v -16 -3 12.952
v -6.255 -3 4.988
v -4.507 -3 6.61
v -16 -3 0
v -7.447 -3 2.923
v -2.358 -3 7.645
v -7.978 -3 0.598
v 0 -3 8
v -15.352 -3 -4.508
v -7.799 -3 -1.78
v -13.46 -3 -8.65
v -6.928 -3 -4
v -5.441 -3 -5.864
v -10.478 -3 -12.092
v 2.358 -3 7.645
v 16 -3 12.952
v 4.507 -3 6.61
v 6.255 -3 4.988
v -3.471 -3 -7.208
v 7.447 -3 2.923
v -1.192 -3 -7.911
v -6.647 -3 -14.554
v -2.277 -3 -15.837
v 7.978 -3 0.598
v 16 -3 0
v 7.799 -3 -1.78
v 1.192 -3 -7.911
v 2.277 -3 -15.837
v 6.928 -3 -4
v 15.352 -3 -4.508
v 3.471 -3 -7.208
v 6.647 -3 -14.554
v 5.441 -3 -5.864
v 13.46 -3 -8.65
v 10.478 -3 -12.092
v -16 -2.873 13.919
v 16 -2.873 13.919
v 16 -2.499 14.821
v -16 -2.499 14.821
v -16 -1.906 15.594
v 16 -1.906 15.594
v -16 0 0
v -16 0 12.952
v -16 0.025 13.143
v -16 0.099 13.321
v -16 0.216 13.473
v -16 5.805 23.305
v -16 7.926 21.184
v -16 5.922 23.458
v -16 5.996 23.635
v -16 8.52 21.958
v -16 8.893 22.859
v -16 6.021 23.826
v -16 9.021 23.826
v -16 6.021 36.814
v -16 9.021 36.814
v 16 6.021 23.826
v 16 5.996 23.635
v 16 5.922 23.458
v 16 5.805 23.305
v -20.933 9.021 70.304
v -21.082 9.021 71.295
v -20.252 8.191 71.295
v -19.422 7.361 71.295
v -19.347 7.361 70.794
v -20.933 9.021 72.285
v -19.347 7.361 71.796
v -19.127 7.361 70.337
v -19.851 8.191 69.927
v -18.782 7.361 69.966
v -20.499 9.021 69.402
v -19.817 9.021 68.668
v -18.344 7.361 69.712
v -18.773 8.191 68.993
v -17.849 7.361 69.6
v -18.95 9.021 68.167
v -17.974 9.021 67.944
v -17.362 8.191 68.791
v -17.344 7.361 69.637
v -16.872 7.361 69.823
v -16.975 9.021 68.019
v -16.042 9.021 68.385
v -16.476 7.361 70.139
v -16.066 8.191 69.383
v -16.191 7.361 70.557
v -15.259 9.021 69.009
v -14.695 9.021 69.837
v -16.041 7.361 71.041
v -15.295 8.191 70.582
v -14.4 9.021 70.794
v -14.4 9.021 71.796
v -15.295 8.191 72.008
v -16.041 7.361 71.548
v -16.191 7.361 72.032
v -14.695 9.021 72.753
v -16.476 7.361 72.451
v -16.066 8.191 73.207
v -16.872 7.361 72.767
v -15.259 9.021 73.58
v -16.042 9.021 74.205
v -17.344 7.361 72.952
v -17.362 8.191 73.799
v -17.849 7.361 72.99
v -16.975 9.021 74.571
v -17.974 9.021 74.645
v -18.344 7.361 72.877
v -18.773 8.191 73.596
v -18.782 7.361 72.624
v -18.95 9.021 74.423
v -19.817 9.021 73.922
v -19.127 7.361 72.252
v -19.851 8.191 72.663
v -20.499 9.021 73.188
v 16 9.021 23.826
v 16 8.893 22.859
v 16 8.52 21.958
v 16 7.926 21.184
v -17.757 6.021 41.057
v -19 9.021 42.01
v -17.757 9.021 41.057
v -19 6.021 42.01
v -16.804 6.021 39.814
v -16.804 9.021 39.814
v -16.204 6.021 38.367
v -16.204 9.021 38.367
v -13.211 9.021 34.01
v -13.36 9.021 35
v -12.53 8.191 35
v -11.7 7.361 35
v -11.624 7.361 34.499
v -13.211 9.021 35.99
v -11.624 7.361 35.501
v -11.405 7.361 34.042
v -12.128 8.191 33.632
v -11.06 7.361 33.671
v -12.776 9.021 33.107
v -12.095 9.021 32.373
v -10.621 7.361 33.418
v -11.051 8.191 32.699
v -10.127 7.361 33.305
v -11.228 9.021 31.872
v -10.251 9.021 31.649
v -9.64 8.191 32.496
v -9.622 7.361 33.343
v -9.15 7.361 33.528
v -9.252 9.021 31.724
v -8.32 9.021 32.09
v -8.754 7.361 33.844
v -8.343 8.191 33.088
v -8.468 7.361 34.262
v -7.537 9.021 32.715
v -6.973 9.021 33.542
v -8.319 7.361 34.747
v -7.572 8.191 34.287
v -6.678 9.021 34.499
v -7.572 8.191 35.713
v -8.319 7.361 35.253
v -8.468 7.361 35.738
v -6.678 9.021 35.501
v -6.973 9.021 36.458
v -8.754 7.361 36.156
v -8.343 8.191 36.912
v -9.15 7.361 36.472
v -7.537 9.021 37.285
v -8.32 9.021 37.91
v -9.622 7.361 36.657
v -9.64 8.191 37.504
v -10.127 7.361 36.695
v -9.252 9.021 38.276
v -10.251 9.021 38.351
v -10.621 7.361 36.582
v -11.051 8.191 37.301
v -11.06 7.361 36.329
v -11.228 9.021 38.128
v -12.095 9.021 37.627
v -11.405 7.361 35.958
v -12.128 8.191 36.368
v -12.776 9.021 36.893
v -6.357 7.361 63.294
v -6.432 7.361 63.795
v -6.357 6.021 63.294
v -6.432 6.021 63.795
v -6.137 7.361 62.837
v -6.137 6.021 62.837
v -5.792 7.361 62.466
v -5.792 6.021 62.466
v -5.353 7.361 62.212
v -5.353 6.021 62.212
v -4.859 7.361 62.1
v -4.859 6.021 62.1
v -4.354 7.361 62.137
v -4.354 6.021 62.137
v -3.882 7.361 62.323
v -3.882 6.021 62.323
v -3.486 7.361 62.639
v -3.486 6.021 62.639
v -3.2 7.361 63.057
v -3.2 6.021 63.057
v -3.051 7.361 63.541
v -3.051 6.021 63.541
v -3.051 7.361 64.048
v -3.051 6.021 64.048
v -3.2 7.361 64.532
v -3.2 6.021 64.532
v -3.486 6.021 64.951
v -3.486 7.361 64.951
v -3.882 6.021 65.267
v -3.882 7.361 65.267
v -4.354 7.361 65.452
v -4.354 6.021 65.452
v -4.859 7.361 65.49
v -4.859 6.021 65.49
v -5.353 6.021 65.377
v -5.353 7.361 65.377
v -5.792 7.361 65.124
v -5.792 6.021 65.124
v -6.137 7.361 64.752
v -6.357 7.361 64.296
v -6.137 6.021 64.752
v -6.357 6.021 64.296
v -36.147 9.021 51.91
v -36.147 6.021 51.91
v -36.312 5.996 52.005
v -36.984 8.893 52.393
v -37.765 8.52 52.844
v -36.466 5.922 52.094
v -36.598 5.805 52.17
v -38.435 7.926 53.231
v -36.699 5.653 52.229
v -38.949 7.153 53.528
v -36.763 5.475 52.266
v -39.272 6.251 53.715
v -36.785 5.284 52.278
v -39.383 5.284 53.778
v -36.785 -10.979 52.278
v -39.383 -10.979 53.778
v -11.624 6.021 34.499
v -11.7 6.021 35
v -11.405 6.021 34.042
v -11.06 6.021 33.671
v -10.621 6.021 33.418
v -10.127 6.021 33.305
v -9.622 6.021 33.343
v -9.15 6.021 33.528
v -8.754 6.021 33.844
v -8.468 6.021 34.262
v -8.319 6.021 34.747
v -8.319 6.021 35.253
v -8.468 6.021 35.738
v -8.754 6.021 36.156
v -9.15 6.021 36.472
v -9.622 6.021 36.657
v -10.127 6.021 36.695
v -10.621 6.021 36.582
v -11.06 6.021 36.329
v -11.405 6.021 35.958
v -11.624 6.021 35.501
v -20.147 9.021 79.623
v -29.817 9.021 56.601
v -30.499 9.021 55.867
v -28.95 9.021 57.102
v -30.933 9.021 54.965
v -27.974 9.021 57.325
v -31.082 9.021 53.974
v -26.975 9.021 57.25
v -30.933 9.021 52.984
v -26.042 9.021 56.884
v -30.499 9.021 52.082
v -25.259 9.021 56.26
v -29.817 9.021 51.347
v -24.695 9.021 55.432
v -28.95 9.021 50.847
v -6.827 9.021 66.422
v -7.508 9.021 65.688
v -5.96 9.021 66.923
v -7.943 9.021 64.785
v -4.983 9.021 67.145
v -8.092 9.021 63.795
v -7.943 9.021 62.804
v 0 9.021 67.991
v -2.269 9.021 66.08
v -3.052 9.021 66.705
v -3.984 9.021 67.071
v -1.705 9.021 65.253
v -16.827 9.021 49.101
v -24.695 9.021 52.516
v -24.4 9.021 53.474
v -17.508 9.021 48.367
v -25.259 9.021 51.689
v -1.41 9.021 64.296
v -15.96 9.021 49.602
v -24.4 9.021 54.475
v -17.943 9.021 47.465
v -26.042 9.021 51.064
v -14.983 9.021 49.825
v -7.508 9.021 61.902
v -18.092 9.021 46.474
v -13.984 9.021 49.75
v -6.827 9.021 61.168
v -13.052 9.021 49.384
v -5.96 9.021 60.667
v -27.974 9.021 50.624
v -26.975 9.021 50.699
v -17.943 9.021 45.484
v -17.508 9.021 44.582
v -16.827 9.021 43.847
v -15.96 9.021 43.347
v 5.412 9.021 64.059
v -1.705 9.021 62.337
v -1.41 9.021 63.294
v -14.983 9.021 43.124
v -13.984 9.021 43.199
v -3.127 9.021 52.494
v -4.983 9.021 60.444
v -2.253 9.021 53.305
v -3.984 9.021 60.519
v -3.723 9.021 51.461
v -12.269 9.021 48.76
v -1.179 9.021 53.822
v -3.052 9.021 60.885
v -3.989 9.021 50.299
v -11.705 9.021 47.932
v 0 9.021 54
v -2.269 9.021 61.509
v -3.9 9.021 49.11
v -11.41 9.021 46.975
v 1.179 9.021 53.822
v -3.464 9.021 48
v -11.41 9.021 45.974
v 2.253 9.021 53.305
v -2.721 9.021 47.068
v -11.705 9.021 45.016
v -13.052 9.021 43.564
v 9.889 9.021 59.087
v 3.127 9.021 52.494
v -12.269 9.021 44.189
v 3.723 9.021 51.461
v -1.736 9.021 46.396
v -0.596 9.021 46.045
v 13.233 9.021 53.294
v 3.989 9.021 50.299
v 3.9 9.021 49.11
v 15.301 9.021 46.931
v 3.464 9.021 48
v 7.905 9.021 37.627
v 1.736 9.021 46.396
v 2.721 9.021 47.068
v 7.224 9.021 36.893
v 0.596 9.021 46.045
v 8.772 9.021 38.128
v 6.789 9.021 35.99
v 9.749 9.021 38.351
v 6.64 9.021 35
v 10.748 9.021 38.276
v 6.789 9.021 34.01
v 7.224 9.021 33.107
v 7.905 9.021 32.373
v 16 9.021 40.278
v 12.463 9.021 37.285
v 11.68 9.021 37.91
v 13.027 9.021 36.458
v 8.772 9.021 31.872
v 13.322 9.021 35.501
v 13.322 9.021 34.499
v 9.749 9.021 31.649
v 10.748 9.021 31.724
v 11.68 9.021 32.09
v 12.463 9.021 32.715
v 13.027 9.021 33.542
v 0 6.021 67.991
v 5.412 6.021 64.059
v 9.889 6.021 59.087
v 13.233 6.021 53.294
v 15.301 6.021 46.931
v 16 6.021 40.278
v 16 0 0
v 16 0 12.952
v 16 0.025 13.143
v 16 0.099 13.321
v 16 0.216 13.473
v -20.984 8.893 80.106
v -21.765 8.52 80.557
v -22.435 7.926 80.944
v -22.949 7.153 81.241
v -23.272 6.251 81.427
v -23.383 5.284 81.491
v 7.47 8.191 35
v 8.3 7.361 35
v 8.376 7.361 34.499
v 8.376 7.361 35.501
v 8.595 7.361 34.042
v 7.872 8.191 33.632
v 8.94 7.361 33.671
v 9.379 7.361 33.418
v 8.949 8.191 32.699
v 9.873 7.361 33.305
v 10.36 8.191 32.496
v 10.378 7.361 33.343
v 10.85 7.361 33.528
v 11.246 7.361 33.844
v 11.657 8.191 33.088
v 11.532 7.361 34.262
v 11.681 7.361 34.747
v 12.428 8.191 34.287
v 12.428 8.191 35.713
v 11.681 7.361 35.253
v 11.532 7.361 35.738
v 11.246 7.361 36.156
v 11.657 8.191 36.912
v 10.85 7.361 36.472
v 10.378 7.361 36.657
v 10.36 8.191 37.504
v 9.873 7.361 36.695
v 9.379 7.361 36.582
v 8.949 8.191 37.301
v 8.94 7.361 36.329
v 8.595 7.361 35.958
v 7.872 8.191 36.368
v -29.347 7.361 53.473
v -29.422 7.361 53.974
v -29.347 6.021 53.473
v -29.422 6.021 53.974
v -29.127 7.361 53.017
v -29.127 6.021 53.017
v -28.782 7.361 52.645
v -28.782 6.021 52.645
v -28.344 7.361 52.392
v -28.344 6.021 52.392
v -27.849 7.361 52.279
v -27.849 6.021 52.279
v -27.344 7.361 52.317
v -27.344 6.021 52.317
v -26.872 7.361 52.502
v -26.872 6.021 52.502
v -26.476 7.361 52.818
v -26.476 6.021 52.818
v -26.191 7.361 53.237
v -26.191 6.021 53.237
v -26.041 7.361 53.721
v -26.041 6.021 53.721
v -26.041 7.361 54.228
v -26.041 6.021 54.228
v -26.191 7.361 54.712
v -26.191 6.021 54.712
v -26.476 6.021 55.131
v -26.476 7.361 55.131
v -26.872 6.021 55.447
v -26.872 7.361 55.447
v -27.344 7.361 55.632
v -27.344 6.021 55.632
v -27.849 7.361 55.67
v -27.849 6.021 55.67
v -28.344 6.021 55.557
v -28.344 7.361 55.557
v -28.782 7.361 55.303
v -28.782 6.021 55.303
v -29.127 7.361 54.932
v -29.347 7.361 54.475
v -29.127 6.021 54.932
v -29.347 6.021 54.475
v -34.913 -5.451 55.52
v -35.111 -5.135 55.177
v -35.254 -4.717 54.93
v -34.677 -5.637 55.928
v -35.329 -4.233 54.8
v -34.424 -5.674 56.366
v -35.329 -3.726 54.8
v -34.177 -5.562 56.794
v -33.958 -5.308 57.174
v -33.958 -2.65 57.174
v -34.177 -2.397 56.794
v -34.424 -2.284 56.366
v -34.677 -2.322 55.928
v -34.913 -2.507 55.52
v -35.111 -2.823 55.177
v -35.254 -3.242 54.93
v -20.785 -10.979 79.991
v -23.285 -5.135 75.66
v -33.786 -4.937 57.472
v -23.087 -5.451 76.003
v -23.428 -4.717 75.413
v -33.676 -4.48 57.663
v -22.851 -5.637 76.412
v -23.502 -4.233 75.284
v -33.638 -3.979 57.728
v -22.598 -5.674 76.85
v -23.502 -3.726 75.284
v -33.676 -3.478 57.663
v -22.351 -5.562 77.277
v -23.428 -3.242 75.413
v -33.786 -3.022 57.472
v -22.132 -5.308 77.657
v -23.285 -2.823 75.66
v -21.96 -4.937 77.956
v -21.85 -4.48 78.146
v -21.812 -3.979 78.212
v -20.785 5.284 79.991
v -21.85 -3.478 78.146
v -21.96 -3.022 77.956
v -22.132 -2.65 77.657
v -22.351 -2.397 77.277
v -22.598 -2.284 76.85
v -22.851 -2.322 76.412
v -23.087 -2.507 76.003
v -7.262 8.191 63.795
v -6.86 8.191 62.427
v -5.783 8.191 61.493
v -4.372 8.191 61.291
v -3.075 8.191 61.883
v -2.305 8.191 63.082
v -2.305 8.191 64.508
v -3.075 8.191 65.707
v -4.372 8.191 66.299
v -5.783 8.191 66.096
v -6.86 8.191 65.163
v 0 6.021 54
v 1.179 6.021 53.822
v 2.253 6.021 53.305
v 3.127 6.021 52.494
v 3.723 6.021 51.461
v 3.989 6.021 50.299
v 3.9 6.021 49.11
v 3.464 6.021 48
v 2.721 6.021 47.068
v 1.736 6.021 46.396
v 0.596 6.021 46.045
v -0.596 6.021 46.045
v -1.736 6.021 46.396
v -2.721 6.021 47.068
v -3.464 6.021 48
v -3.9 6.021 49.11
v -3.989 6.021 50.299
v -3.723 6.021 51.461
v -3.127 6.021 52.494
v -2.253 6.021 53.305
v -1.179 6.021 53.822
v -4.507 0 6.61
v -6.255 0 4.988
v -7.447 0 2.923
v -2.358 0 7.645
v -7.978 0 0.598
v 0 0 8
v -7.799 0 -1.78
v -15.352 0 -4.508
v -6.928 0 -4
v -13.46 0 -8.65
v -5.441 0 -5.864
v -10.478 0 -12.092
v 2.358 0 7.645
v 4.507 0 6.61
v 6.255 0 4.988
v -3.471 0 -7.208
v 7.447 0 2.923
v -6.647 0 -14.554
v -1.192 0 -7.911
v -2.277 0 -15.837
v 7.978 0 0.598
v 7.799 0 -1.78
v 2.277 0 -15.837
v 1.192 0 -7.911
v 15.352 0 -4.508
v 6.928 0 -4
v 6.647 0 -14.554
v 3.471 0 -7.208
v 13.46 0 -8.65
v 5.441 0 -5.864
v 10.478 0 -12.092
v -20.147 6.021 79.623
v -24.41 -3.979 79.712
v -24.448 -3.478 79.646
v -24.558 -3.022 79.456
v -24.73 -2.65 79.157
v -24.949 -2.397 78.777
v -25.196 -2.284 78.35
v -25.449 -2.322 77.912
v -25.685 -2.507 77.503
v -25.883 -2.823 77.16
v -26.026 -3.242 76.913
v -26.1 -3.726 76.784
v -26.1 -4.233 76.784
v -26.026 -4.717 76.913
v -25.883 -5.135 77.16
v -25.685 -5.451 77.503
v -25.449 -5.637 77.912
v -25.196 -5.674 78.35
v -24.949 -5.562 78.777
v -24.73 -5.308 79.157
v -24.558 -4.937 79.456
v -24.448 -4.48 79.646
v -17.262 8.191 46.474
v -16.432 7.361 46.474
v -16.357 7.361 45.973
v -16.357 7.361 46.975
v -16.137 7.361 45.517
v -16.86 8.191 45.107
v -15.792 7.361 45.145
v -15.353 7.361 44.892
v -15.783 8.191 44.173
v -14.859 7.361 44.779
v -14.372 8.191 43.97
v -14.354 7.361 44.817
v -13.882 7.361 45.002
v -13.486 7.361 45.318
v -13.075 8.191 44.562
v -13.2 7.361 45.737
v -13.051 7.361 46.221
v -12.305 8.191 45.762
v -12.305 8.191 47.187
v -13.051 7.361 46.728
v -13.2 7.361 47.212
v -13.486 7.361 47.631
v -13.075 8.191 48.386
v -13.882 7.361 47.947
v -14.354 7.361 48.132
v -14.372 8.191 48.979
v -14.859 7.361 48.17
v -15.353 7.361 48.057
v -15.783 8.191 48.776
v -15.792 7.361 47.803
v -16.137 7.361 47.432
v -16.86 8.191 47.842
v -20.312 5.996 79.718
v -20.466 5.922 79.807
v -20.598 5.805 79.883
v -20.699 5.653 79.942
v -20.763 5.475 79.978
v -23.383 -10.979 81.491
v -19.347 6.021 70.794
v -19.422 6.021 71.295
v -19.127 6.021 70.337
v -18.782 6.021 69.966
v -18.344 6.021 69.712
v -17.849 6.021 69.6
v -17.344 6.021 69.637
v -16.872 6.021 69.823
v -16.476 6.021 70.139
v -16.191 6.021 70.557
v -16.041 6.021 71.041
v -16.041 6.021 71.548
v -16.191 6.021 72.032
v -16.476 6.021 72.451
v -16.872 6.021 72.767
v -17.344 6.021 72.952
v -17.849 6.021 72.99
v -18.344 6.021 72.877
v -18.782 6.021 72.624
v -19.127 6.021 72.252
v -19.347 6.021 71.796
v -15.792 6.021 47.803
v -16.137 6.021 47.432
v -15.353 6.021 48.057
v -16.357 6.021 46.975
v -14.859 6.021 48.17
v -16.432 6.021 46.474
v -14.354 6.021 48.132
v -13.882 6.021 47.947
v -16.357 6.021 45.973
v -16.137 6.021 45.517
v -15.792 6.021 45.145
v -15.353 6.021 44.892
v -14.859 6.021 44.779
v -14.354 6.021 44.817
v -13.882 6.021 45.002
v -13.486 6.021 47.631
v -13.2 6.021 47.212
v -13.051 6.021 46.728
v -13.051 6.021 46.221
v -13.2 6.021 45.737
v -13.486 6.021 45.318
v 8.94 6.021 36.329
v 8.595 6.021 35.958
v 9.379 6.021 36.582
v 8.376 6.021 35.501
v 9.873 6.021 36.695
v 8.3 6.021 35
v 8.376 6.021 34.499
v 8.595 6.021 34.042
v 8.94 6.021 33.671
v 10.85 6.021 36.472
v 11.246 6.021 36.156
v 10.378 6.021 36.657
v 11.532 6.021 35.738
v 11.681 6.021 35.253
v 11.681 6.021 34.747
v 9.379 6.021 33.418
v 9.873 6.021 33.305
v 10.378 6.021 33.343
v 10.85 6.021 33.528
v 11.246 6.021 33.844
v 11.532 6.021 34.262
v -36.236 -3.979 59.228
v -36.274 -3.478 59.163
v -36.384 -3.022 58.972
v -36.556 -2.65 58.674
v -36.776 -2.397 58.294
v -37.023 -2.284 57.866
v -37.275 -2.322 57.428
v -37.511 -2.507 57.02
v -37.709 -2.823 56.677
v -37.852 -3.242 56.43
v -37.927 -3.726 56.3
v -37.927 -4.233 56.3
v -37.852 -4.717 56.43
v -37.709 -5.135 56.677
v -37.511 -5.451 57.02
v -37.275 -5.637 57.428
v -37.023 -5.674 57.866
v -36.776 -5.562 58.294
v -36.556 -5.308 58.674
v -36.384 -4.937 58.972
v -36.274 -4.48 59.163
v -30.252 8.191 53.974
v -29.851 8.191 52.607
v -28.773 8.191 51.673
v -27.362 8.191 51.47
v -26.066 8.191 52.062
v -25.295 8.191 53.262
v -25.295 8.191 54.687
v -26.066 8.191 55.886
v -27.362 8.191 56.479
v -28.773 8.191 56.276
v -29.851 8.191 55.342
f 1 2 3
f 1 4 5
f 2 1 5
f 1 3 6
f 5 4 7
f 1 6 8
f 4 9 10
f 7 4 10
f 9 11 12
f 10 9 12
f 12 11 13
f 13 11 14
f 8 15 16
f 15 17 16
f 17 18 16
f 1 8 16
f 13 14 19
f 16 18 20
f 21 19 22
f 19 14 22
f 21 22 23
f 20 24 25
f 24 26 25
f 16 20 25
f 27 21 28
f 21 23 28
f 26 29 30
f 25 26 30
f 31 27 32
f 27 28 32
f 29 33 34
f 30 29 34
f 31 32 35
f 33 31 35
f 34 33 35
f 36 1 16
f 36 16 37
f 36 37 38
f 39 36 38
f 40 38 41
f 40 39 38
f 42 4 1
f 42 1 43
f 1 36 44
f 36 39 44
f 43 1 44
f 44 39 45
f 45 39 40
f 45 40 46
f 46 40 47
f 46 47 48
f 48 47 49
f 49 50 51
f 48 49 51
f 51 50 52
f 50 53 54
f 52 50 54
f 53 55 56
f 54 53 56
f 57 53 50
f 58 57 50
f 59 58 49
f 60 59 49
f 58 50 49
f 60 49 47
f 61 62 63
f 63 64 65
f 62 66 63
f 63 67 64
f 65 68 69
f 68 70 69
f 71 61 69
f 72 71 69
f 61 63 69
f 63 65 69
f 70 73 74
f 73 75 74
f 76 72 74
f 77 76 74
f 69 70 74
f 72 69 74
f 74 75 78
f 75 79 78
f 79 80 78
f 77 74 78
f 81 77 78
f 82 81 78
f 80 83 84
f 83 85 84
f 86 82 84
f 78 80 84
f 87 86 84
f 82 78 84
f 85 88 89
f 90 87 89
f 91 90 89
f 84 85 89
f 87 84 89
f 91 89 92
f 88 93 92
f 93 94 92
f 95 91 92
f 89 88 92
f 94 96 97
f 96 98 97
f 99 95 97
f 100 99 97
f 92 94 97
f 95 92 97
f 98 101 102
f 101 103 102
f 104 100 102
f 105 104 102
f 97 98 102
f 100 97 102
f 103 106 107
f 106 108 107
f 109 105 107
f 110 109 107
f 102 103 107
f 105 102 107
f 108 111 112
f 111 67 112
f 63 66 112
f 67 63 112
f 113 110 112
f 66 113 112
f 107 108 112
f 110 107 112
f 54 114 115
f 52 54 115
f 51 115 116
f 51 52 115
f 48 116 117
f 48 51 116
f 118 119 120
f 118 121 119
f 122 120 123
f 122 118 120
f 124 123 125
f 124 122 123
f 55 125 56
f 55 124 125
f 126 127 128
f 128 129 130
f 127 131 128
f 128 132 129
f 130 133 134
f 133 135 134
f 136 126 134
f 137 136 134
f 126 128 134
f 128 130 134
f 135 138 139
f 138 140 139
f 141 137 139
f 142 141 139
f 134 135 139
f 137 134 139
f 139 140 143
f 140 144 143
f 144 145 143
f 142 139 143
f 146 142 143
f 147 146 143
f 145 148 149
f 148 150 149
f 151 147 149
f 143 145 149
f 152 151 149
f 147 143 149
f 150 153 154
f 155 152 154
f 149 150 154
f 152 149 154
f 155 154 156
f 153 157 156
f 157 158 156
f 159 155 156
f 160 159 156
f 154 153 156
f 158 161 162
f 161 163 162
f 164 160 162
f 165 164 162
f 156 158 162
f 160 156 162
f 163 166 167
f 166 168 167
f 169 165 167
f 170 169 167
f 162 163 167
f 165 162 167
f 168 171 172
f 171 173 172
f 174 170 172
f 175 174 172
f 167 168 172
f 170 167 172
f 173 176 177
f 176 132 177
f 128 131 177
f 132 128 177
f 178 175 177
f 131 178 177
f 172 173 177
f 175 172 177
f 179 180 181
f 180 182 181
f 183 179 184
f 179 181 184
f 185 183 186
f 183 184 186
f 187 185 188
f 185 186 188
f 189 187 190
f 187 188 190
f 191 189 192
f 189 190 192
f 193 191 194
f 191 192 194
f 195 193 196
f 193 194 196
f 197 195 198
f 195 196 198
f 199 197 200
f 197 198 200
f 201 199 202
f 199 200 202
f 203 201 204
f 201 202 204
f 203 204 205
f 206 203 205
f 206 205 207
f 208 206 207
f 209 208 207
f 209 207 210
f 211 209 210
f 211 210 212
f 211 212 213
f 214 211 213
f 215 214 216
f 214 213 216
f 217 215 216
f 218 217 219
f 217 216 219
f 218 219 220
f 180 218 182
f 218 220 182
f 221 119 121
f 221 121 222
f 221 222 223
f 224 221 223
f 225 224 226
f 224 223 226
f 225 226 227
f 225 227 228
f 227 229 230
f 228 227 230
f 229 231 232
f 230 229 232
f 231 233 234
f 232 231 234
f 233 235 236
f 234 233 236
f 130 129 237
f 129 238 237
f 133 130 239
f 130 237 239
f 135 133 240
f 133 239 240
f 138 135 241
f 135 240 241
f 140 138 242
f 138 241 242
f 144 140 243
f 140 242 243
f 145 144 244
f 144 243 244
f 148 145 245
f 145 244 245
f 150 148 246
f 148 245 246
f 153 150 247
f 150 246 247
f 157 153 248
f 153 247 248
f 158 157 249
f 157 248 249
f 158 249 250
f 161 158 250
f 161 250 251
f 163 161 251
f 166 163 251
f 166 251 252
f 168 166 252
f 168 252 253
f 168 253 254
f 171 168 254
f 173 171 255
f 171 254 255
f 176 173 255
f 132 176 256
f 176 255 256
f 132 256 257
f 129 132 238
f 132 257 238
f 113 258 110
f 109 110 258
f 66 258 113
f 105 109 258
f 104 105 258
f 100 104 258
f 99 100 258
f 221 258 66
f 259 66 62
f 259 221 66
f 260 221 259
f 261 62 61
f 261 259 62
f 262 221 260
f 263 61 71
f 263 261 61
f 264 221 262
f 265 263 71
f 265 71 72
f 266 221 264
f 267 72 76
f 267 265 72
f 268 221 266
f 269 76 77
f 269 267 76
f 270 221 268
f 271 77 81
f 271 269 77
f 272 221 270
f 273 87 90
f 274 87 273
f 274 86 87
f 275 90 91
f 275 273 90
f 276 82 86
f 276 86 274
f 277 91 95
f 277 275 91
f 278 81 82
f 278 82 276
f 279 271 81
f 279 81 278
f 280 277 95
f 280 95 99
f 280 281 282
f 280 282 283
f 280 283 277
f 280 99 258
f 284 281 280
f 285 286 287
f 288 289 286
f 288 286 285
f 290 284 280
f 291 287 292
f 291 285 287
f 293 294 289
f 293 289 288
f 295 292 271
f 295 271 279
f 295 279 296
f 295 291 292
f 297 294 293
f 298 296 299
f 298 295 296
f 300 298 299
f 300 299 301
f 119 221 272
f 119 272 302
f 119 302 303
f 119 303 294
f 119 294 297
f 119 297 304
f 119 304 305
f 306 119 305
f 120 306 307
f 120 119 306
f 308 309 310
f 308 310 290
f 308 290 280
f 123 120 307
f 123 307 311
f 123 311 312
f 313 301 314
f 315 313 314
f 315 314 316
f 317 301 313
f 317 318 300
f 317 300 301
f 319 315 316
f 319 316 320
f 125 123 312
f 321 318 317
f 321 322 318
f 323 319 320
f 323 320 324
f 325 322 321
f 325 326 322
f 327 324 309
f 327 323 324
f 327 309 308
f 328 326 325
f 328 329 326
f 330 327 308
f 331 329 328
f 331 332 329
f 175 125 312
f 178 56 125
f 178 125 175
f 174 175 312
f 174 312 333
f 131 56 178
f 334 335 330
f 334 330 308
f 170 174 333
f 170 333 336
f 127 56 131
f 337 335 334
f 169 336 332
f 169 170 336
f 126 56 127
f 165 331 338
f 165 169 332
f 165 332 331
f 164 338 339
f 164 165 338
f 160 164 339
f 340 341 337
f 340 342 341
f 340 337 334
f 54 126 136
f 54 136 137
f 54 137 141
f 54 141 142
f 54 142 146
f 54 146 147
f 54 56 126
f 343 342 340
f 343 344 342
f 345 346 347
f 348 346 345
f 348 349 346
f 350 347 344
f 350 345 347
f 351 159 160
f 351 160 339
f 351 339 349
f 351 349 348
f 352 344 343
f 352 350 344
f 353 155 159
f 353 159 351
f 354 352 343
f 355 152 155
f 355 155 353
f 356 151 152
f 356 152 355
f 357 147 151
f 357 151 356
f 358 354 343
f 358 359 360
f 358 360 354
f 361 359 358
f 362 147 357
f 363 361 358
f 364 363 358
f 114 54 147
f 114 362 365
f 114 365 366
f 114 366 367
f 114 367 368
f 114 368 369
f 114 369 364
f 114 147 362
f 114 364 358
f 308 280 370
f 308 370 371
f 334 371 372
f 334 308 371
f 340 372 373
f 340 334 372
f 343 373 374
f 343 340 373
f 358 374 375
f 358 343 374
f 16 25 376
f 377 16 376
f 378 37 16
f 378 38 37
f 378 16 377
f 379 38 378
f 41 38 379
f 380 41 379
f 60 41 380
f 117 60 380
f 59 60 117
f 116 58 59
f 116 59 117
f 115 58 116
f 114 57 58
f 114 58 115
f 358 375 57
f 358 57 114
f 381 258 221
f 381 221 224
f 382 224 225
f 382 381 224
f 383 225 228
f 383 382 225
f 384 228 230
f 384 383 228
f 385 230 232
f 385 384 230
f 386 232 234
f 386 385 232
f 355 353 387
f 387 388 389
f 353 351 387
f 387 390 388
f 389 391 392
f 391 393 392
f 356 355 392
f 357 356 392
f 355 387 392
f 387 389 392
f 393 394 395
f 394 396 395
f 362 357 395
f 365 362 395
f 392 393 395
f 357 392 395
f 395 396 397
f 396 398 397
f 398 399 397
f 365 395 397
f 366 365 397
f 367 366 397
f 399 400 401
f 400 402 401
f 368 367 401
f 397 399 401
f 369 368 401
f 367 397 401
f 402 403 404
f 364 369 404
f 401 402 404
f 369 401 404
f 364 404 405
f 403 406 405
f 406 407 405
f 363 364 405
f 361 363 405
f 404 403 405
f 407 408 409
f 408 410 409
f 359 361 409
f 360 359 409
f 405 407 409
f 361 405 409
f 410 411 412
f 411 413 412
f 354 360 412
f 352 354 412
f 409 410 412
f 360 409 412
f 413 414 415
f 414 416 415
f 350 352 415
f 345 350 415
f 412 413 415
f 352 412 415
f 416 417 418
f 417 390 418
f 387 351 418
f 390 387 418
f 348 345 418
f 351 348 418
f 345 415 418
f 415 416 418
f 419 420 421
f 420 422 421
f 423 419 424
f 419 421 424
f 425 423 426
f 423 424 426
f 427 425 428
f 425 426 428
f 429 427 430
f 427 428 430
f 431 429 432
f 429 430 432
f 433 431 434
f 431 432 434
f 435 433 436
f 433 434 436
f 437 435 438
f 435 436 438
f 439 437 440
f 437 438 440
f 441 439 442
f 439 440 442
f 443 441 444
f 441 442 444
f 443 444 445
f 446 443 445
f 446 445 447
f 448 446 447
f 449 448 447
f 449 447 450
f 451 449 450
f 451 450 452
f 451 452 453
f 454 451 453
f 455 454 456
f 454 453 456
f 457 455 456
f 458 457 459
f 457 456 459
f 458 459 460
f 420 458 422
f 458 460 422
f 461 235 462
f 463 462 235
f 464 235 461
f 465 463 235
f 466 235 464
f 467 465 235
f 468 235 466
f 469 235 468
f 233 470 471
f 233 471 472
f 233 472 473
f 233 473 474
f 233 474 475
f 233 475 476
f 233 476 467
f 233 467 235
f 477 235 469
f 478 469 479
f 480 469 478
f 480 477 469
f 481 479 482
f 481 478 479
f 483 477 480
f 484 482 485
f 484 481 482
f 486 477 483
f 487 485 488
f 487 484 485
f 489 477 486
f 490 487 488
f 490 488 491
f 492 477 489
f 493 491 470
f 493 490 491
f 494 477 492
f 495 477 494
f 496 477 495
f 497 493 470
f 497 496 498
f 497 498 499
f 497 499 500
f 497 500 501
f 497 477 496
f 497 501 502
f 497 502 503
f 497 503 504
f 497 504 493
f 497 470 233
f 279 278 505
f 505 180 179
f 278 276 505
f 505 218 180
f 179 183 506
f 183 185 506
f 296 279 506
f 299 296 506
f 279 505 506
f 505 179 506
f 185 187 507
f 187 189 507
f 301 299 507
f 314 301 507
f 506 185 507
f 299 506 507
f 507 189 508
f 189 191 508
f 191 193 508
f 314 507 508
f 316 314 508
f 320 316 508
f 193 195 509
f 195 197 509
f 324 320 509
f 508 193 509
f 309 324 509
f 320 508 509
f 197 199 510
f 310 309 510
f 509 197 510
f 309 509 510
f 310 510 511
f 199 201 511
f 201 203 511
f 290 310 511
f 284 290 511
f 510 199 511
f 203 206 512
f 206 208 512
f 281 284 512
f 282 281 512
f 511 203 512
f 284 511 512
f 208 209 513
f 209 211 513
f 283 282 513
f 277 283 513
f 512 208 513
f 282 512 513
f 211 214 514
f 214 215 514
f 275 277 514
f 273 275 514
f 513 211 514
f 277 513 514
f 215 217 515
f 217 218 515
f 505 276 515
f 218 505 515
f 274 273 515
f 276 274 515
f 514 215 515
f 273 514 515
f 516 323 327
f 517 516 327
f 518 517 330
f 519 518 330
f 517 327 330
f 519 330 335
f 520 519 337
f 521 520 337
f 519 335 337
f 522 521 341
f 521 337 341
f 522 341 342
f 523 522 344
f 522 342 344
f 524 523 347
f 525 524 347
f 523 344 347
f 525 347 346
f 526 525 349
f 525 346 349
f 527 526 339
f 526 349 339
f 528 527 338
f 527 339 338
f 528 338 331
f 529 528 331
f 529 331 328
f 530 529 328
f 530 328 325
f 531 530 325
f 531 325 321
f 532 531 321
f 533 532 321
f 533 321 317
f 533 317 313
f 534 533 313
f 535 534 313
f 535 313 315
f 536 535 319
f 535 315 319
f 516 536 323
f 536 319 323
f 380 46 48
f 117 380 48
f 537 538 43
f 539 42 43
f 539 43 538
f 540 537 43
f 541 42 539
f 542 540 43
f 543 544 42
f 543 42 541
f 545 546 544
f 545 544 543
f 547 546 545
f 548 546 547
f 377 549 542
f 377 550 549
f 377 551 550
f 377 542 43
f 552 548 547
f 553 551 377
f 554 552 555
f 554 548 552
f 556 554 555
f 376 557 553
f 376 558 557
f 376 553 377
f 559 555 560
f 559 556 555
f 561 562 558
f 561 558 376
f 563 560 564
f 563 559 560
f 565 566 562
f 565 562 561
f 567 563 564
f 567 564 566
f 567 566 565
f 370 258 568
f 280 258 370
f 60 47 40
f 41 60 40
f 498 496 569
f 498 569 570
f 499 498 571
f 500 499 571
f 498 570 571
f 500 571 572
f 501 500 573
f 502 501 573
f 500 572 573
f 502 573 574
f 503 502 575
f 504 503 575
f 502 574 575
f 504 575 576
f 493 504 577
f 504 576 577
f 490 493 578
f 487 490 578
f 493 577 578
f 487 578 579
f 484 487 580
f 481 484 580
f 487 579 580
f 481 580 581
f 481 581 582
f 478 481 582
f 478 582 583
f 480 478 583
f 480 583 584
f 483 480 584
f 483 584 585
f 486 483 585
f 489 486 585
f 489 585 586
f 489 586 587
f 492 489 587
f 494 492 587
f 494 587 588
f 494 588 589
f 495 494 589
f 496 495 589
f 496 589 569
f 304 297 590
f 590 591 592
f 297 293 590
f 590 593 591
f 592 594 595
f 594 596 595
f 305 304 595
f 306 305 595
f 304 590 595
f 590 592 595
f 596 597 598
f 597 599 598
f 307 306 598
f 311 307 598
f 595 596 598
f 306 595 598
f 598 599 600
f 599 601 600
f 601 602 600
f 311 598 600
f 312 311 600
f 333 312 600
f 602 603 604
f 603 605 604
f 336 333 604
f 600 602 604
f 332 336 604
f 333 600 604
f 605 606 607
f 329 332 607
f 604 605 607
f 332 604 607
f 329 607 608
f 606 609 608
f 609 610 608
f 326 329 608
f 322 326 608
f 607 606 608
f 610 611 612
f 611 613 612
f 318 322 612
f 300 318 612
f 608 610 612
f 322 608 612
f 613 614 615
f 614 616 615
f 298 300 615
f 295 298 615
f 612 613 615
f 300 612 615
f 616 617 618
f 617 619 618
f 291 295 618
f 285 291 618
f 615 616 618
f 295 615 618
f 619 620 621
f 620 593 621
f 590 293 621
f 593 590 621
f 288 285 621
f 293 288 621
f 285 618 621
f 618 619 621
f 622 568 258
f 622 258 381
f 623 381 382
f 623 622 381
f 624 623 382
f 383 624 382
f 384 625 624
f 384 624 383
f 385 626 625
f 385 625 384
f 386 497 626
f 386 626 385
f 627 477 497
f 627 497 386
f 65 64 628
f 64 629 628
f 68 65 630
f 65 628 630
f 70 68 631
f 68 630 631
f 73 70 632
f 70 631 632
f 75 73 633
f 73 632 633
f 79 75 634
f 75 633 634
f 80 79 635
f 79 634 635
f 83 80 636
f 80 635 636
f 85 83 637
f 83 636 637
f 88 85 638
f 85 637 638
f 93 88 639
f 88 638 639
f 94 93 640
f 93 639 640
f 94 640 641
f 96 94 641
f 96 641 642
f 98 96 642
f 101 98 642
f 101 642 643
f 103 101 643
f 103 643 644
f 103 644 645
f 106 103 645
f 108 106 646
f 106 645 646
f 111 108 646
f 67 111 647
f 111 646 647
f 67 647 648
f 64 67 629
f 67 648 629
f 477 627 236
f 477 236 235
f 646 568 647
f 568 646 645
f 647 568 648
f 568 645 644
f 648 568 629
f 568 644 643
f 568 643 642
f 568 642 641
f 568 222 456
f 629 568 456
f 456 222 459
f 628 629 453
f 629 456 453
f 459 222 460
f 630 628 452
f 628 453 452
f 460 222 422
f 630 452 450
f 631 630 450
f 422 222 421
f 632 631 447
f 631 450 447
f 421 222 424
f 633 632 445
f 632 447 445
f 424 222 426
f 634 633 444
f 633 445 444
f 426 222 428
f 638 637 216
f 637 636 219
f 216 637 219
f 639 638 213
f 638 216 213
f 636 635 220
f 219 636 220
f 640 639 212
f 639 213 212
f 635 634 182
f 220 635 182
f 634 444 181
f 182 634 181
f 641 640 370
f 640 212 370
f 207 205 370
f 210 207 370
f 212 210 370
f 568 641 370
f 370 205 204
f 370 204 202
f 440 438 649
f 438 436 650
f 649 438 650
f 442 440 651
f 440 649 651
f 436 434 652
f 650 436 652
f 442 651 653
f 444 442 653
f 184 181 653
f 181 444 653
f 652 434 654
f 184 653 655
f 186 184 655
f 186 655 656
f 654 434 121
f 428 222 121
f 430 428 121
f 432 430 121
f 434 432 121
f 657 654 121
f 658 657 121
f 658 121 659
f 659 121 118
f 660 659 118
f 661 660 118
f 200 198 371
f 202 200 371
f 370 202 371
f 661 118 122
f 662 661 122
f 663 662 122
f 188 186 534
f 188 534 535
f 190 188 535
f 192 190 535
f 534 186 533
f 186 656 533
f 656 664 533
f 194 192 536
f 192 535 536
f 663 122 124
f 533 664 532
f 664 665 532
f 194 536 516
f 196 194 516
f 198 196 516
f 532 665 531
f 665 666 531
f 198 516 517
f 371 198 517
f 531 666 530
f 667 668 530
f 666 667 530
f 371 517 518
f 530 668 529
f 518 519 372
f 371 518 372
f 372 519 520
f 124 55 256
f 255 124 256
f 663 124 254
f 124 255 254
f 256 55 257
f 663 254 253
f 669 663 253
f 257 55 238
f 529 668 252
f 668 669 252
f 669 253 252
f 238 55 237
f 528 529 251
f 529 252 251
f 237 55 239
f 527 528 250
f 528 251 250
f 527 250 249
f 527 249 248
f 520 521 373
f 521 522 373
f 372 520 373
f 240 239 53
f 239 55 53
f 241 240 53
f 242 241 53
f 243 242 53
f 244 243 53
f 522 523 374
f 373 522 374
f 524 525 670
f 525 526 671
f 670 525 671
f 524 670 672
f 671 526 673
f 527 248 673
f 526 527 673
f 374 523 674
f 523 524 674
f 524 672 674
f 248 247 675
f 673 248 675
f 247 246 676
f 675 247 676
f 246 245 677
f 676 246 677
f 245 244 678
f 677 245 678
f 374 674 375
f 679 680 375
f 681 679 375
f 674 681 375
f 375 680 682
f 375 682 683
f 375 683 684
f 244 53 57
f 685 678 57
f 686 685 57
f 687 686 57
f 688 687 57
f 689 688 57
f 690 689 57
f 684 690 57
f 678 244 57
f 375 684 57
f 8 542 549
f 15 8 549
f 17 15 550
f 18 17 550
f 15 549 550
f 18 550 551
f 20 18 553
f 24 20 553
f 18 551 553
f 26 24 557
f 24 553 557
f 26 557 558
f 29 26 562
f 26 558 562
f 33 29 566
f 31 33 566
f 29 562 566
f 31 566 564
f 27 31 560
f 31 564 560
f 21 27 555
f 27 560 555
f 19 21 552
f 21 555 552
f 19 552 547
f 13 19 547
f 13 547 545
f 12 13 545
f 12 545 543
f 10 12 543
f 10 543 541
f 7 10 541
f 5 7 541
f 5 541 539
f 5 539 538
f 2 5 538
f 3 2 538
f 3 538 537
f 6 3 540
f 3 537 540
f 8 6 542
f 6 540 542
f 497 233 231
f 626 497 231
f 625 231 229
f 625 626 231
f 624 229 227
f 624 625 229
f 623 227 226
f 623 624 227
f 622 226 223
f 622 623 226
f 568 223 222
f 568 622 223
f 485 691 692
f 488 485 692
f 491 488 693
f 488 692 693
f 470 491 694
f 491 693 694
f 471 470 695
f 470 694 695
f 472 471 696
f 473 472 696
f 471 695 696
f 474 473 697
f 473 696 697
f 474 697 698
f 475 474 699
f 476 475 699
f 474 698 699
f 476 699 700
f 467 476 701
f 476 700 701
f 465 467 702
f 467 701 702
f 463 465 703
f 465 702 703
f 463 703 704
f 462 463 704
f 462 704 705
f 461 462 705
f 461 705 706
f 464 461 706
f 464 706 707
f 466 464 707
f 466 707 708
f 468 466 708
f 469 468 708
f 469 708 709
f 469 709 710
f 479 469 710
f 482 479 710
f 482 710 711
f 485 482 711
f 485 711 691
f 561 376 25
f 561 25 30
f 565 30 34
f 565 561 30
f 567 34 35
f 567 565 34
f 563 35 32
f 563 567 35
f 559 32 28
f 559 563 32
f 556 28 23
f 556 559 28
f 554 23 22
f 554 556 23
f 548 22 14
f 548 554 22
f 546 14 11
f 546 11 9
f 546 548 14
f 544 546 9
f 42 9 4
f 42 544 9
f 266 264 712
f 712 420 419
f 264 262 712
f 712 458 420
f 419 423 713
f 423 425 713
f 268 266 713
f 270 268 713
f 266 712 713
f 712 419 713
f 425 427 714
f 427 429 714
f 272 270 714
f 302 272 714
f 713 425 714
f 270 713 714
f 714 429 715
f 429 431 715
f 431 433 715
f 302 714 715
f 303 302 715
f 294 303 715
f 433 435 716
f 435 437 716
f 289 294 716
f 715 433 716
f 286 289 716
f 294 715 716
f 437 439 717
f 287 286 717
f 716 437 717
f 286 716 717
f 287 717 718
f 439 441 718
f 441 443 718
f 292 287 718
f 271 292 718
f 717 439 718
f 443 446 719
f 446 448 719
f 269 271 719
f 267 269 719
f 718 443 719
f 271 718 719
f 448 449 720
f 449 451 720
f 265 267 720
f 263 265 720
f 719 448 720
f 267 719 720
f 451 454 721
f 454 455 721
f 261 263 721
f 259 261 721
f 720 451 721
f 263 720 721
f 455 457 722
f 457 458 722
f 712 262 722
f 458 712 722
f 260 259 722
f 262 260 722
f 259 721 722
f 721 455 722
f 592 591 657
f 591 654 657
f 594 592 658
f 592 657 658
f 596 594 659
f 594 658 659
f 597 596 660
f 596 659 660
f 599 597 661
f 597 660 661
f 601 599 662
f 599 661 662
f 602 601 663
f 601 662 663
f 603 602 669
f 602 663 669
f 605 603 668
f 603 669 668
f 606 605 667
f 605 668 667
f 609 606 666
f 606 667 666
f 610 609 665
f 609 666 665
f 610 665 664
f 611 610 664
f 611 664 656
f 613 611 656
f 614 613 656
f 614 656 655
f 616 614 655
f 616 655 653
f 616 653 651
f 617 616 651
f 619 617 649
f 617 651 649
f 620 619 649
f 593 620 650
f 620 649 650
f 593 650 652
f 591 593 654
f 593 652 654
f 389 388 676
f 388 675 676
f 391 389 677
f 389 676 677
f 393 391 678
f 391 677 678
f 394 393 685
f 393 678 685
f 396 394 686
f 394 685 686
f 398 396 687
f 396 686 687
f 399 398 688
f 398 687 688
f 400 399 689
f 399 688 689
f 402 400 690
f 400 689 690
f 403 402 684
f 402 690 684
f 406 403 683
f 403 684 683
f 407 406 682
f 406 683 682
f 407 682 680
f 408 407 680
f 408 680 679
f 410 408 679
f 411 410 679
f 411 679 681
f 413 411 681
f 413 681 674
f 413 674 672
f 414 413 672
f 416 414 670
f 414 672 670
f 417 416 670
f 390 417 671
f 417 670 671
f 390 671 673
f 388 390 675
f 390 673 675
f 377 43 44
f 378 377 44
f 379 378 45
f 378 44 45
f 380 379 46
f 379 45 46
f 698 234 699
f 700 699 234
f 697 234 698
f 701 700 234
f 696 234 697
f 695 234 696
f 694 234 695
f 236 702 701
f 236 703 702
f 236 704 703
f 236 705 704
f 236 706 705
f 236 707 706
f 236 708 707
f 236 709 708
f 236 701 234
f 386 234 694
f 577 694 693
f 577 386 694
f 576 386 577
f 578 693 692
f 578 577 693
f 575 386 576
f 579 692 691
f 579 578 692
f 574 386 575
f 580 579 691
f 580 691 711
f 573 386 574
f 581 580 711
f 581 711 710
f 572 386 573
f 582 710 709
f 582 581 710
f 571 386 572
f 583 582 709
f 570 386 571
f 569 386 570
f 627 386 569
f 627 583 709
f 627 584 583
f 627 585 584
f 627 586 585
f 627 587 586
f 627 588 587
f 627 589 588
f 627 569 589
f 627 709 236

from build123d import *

# Parameters (mm, degrees)
SKETCH2_R                                            = 8
BASE_FLANGE1_DEPTH                                   = 3
EDGE_FLANGE1_START                                   = -16
EDGE_FLANGE1_DEPTH                                   = 32
EDGE_FLANGE1_2_DEPTH                                 = 32
EDGE_FLANGE2_START                                   = -16
EDGE_FLANGE2_DEPTH                                   = 32
EDGE_FLANGE2_2_DEPTH                                 = 32
SKETCH15_R                                           = 4
BOSS_EXTRUDE1_DEPTH                                  = 3
EDGE_FLANGE3_STRIP_W                                 = 13.4732
EDGE_FLANGE3_STRIP_H                                 = 3
EDGE_FLANGE3_STRIP_CUT_DEPTH                         = 32
EDGE_FLANGE3_DEPTH                                   = 32
CSK_FOR_M3_HEX_SOCKET_COUNTERSUNK_CAP_SC_D           = 3.4
CSK_FOR_M3_HEX_SOCKET_COUNTERSUNK_CAP_SC_CSINK_D     = 6.72
CSK_FOR_M3_HEX_SOCKET_COUNTERSUNK_CAP_SC_CSINK_ANGLE = 90
FILLET1_R                                            = 6
M3_CLEARANCE_HOLE1_D                                 = 3.4


# Read off the part's stored shape, not the designer's step: Edge-Flange1, Edge-Flange2
# Sheet-metal steps are written as plain solids
with BuildPart() as part:
    # Sketch2 → Base-Flange1 (new body)
    with BuildSketch(Plane(origin=(0, 0, 0), x_dir=(1, 0, 0), z_dir=(0, 1, 0))):
        with BuildLine():
            Line((-16, 0), (-16, -17.5))
            Line((-16, -17.5), (16, -17.5))
            Line((16, -17.5), (16, 0))
            ThreePointArc((16, 0), (0, 16), (-16, 0))
        make_face()
        with Locations(Location((0, 0, 0), (0, 0, 270))):
            Circle(SKETCH2_R, mode=Mode.SUBTRACT)
    extrude(amount=-BASE_FLANGE1_DEPTH)

    # Edge-Flange1 outline → Edge-Flange1 (cut)
    with BuildSketch(Plane.YZ.offset(EDGE_FLANGE1_START)):
        with BuildLine():
            ThreePointArc((-3, 12.952249603), (-2.715568261, 14.382184516), (-1.905575199, 15.594424801))
            Line((-1.905575199, 15.594424801), (0, 17.5))
            Line((0, 17.5), (-3, 17.5))
            Line((-3, 17.5), (-3, 12.952249603))
        make_face()
    extrude(amount=EDGE_FLANGE1_DEPTH, mode=Mode.SUBTRACT)

    # Edge-Flange1 2 outline → Edge-Flange1 2 (add)
    with BuildSketch(Plane.YZ.offset(EDGE_FLANGE1_START)):
        with BuildLine():
            Line((9.02081528, 26.52081528), (0, 17.5))
            Line((0, 17.5), (0, 12.952249603))
            ThreePointArc((0, 12.952249603), (0.056070336, 13.234134219), (0.215745145, 13.473104458))
            Line((0.215745145, 13.473104458), (11.142135624, 24.399494937))
            Line((11.142135624, 24.399494937), (9.02081528, 26.52081528))
        make_face()
    extrude(amount=EDGE_FLANGE1_2_DEPTH)

    # Edge-Flange2 outline → Edge-Flange2 (cut)
    with BuildSketch(Plane.YZ.offset(EDGE_FLANGE2_START)):
        with BuildLine():
            Line((9.02081528, 26.52081528), (9.02081528, 23.82592499))
            ThreePointArc((9.02081528, 23.82592499), (8.736383541, 22.395990077), (7.926390479, 21.183749792))
            Line((7.926390479, 21.183749792), (11.142135624, 24.399494937))
            Line((11.142135624, 24.399494937), (9.02081528, 26.52081528))
        make_face()
    extrude(amount=EDGE_FLANGE2_DEPTH, mode=Mode.SUBTRACT)

    # Edge-Flange2 2 outline → Edge-Flange2 2 (add)
    with BuildSketch(Plane.YZ.offset(EDGE_FLANGE2_START)):
        with BuildLine():
            Line((5.805070135, 23.305070135), (9.02081528, 26.52081528))
            Line((9.02081528, 26.52081528), (9.02081528, 40.278174593))
            Line((9.02081528, 40.278174593), (6.02081528, 40.278174593))
            Line((6.02081528, 40.278174593), (6.02081528, 23.82592499))
            ThreePointArc((6.02081528, 23.82592499), (5.964744944, 23.544040374), (5.805070135, 23.305070135))
        make_face()
    extrude(amount=EDGE_FLANGE2_2_DEPTH)

    # Sketch15 → Boss-Extrude1 (add)
    with BuildSketch(Plane(origin=(0, 9.02081528, 0), x_dir=(1, 0, 0), z_dir=(0, 1, 0))):
        with BuildLine():
            Line((-16, -40.278174593), (-36.784609691, -52.278174593))
            Line((-36.784609691, -52.278174593), (-20.784609691, -79.990987514))
            Line((-20.784609691, -79.990987514), (0, -67.990987514))
            ThreePointArc((0, -67.990987514), (11.712812921, -56.278174593), (16, -40.278174593))
            Line((16, -40.278174593), (-16, -40.278174593))
        make_face()
        with Locations(Location((0, -50, 0), (0, 0, 270))):
            Circle(SKETCH15_R, mode=Mode.SUBTRACT)
    extrude(amount=-BOSS_EXTRUDE1_DEPTH)

    # Edge-Flange3 strip (across the edge) → Edge-Flange3 strip cut (cut)
    with BuildSketch(Plane(origin=(-20.784609691, 6.02081528, 79.990987514), x_dir=(0.8660254037844396, -3.491481338843133e-15, -0.4999999999999983), z_dir=(-0.4999999999999983, 0, -0.8660254037844396))):
        with Locations((-6, -1.5)):
            Rectangle(EDGE_FLANGE3_STRIP_W, EDGE_FLANGE3_STRIP_H)
    extrude(amount=EDGE_FLANGE3_STRIP_CUT_DEPTH, mode=Mode.SUBTRACT)

    # Edge-Flange3 section (across the edge) → Edge-Flange3 (add)
    with BuildSketch(Plane(origin=(-20.784609691, 6.02081528, 79.990987514), x_dir=(0.8660254037844396, -3.491481338843133e-15, -0.4999999999999983), z_dir=(-0.4999999999999983, 0, -0.8660254037844396))):
        with BuildLine():
            Line((-3, 0.7366), (-3, 17))
            Line((-3, 17), (0, 17))
            Line((0, 17), (0, 0.7366))
            ThreePointArc((0, 0.7366), (0.215745145, 0.215745145), (0.7366, 0))
            Line((0.7366, 0), (0.7366, -3))
            ThreePointArc((0.7366, -3), (-1.905575199, -1.905575199), (-3, 0.7366))
        make_face()
    extrude(amount=EDGE_FLANGE3_DEPTH)

    # CSK for M3 Hex Socket Countersunk Cap Screw1 (through all)
    with Locations(Plane(origin=(0, 9.02081528, 0), x_dir=(1, 0, 0), z_dir=(0, 1, 0))):
        with Locations((-27.722431864, -53.974327016), (-14.732050808, -46.474327016), (-4.732050808, -63.794835091), (-17.722431864, -71.294835091), (-10, -35), (10, -35)):
            CounterSinkHole(CSK_FOR_M3_HEX_SOCKET_COUNTERSUNK_CAP_SC_D / 2, CSK_FOR_M3_HEX_SOCKET_COUNTERSUNK_CAP_SC_CSINK_D / 2, counter_sink_angle=CSK_FOR_M3_HEX_SOCKET_COUNTERSUNK_CAP_SC_CSINK_ANGLE)

    # Fillet1
    fillet1_edges = [part.edges().sort_by_distance(p)[0] for p in [
        (-16, 7.52081528, 40.278174593),
    ]]
    fillet(fillet1_edges, radius=FILLET1_R)

    # M3 Clearance Hole1 (through all)
    with Locations(Plane(origin=(-50.225570899, 0, 28.997746879), x_dir=(-0.49999999999999806, 2.339652494442703e-15, -0.8660254037844398), z_dir=(0.8660254037844397, -4.052396992430042e-15, -0.499999999999998))):
        with Locations((-55.127433482, -3.97918472), (-31.475106897, -3.97918472)):
            Hole(M3_CLEARANCE_HOLE1_D / 2)


solid = part.part
